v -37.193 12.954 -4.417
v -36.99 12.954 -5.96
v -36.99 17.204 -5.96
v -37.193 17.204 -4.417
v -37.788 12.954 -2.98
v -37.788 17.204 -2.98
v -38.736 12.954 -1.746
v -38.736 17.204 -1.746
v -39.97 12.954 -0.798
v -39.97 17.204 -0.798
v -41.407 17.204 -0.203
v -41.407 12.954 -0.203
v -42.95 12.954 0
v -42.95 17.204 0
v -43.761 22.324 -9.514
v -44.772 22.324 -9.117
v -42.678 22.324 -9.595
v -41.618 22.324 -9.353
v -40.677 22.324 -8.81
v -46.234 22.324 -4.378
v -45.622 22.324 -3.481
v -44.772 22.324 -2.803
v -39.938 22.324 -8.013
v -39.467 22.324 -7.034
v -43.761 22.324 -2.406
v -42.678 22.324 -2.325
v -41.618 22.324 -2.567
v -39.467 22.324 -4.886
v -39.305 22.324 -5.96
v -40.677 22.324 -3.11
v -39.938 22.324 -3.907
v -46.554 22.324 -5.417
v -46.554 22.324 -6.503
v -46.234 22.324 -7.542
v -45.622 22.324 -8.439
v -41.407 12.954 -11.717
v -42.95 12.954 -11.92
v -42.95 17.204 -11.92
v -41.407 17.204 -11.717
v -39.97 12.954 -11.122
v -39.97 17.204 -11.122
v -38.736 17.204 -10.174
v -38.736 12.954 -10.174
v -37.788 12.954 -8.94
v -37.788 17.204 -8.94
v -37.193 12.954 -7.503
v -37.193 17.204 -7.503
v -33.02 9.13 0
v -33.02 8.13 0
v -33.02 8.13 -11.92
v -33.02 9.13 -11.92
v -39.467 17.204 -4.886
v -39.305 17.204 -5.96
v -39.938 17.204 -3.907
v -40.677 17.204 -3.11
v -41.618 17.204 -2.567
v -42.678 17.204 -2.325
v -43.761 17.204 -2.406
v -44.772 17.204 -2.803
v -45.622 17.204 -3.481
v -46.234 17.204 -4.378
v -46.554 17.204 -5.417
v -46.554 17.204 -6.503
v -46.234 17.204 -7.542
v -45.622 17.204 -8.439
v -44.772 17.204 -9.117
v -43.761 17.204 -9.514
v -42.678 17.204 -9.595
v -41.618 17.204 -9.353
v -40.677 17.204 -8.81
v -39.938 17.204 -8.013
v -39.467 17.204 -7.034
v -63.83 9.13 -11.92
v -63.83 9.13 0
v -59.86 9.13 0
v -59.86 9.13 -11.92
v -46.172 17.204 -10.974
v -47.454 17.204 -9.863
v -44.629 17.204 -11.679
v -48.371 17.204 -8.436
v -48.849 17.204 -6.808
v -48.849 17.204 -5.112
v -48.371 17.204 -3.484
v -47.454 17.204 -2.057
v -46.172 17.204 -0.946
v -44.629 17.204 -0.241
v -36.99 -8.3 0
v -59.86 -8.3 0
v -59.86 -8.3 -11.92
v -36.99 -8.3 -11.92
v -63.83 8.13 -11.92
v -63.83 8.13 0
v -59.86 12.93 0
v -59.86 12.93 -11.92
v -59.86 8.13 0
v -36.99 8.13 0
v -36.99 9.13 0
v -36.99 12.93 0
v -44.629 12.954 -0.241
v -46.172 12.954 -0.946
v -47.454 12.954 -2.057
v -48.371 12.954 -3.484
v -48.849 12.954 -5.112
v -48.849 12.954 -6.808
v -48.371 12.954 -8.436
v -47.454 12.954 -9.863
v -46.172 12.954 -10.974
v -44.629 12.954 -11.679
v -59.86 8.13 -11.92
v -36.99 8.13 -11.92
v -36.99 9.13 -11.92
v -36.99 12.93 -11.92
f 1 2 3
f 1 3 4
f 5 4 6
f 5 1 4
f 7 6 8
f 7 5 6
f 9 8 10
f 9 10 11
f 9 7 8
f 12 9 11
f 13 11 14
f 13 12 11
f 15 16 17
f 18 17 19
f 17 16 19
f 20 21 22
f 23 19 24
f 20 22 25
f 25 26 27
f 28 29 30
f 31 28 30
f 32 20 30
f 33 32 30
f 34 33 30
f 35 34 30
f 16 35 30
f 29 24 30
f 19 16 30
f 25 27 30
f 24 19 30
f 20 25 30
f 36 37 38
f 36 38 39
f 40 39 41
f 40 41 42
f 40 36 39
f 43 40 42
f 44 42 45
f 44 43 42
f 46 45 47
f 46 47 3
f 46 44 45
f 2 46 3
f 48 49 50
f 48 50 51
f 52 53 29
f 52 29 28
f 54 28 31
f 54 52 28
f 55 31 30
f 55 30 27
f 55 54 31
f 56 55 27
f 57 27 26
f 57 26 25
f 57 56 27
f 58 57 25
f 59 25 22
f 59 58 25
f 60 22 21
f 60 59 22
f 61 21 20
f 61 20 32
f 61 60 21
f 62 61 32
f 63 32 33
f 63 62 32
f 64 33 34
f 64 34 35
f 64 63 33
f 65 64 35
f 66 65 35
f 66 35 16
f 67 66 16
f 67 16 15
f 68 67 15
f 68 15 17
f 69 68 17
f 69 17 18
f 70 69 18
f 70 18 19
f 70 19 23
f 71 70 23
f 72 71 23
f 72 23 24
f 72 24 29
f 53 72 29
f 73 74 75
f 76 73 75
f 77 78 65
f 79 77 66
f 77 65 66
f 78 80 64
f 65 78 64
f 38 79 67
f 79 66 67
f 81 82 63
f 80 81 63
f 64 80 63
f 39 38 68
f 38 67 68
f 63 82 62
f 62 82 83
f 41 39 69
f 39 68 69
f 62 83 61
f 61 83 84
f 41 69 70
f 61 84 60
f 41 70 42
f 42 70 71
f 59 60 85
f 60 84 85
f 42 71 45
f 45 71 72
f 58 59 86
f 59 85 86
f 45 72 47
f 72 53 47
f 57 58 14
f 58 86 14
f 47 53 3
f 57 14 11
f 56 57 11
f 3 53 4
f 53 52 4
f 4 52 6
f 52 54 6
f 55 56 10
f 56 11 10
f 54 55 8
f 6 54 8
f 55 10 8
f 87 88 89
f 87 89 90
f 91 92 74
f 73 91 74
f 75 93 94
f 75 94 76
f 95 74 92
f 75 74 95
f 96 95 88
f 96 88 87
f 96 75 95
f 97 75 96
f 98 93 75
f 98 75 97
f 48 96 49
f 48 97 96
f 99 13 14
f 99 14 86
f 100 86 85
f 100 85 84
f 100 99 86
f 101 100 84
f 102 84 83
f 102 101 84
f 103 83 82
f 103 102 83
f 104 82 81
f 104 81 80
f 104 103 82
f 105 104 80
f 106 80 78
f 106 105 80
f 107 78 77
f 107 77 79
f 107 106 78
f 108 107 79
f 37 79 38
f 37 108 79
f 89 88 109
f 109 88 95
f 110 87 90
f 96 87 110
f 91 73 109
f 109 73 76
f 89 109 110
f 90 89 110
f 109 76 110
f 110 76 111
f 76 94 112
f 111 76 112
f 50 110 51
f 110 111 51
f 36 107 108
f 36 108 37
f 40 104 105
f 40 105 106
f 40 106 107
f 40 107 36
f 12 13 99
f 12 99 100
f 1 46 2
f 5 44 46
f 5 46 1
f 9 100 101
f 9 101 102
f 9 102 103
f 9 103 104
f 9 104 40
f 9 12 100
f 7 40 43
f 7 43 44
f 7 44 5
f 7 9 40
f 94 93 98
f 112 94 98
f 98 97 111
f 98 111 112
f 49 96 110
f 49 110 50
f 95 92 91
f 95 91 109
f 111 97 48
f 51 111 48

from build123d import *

# Parameters (mm, degrees)
F0_W     = 22.87
F0_H     = 3.8
F0_H_2   = 1
F0_W_2   = 3.97
F0_H_3   = 16.43
F3_DEPTH = 11.92
F2_R     = 3.645
F4_DEPTH = 9.37
F5_DEPTH = 4.25


with BuildPart() as f3:
    # F0 (on Top) → F3 (new body)
    with BuildSketch(Plane.XY):
        with Locations((-48.424922, 11.030439)):
            Rectangle(F0_W, F0_H)
        with Locations((-48.424922, 8.630439)):
            Rectangle(F0_W, F0_H_2)
        with Locations((-35.004922, 8.630439)):
            Rectangle(F0_W_2, F0_H_2)
        with Locations((-61.844922, 8.630439)):
            Rectangle(F0_W_2, F0_H_2)
        with Locations((-48.424922, -0.084561)):
            Rectangle(F0_W, F0_H_3)
    extrude(amount=-F3_DEPTH)


with BuildPart() as f4:
    # F2 (on offset) → F4 (new body)
    with BuildSketch(Plane.XZ.offset(-12.954)):
        with Locations((-42.949922, -5.96)):
            Circle(F2_R)
    extrude(amount=-F4_DEPTH)

    # F2 (on offset) → F5 (join)
    with BuildSketch(Plane.XZ.offset(-12.954)):
        with BuildLine():
            ThreePointArc((-42.949922, -11.92), (-38.735566, -10.174356), (-36.989922, -5.96))
            ThreePointArc((-36.989922, -5.96), (-38.735566, -1.745644), (-42.949922, 0))
            ThreePointArc((-42.949922, 0), (-48.909922, -5.96), (-42.949922, -11.92))
        make_face()
        with Locations((-42.949922, -5.96)):
            Circle(F2_R, mode=Mode.SUBTRACT)
    extrude(amount=-F5_DEPTH)


solid = Compound([f3.part, f4.part])
